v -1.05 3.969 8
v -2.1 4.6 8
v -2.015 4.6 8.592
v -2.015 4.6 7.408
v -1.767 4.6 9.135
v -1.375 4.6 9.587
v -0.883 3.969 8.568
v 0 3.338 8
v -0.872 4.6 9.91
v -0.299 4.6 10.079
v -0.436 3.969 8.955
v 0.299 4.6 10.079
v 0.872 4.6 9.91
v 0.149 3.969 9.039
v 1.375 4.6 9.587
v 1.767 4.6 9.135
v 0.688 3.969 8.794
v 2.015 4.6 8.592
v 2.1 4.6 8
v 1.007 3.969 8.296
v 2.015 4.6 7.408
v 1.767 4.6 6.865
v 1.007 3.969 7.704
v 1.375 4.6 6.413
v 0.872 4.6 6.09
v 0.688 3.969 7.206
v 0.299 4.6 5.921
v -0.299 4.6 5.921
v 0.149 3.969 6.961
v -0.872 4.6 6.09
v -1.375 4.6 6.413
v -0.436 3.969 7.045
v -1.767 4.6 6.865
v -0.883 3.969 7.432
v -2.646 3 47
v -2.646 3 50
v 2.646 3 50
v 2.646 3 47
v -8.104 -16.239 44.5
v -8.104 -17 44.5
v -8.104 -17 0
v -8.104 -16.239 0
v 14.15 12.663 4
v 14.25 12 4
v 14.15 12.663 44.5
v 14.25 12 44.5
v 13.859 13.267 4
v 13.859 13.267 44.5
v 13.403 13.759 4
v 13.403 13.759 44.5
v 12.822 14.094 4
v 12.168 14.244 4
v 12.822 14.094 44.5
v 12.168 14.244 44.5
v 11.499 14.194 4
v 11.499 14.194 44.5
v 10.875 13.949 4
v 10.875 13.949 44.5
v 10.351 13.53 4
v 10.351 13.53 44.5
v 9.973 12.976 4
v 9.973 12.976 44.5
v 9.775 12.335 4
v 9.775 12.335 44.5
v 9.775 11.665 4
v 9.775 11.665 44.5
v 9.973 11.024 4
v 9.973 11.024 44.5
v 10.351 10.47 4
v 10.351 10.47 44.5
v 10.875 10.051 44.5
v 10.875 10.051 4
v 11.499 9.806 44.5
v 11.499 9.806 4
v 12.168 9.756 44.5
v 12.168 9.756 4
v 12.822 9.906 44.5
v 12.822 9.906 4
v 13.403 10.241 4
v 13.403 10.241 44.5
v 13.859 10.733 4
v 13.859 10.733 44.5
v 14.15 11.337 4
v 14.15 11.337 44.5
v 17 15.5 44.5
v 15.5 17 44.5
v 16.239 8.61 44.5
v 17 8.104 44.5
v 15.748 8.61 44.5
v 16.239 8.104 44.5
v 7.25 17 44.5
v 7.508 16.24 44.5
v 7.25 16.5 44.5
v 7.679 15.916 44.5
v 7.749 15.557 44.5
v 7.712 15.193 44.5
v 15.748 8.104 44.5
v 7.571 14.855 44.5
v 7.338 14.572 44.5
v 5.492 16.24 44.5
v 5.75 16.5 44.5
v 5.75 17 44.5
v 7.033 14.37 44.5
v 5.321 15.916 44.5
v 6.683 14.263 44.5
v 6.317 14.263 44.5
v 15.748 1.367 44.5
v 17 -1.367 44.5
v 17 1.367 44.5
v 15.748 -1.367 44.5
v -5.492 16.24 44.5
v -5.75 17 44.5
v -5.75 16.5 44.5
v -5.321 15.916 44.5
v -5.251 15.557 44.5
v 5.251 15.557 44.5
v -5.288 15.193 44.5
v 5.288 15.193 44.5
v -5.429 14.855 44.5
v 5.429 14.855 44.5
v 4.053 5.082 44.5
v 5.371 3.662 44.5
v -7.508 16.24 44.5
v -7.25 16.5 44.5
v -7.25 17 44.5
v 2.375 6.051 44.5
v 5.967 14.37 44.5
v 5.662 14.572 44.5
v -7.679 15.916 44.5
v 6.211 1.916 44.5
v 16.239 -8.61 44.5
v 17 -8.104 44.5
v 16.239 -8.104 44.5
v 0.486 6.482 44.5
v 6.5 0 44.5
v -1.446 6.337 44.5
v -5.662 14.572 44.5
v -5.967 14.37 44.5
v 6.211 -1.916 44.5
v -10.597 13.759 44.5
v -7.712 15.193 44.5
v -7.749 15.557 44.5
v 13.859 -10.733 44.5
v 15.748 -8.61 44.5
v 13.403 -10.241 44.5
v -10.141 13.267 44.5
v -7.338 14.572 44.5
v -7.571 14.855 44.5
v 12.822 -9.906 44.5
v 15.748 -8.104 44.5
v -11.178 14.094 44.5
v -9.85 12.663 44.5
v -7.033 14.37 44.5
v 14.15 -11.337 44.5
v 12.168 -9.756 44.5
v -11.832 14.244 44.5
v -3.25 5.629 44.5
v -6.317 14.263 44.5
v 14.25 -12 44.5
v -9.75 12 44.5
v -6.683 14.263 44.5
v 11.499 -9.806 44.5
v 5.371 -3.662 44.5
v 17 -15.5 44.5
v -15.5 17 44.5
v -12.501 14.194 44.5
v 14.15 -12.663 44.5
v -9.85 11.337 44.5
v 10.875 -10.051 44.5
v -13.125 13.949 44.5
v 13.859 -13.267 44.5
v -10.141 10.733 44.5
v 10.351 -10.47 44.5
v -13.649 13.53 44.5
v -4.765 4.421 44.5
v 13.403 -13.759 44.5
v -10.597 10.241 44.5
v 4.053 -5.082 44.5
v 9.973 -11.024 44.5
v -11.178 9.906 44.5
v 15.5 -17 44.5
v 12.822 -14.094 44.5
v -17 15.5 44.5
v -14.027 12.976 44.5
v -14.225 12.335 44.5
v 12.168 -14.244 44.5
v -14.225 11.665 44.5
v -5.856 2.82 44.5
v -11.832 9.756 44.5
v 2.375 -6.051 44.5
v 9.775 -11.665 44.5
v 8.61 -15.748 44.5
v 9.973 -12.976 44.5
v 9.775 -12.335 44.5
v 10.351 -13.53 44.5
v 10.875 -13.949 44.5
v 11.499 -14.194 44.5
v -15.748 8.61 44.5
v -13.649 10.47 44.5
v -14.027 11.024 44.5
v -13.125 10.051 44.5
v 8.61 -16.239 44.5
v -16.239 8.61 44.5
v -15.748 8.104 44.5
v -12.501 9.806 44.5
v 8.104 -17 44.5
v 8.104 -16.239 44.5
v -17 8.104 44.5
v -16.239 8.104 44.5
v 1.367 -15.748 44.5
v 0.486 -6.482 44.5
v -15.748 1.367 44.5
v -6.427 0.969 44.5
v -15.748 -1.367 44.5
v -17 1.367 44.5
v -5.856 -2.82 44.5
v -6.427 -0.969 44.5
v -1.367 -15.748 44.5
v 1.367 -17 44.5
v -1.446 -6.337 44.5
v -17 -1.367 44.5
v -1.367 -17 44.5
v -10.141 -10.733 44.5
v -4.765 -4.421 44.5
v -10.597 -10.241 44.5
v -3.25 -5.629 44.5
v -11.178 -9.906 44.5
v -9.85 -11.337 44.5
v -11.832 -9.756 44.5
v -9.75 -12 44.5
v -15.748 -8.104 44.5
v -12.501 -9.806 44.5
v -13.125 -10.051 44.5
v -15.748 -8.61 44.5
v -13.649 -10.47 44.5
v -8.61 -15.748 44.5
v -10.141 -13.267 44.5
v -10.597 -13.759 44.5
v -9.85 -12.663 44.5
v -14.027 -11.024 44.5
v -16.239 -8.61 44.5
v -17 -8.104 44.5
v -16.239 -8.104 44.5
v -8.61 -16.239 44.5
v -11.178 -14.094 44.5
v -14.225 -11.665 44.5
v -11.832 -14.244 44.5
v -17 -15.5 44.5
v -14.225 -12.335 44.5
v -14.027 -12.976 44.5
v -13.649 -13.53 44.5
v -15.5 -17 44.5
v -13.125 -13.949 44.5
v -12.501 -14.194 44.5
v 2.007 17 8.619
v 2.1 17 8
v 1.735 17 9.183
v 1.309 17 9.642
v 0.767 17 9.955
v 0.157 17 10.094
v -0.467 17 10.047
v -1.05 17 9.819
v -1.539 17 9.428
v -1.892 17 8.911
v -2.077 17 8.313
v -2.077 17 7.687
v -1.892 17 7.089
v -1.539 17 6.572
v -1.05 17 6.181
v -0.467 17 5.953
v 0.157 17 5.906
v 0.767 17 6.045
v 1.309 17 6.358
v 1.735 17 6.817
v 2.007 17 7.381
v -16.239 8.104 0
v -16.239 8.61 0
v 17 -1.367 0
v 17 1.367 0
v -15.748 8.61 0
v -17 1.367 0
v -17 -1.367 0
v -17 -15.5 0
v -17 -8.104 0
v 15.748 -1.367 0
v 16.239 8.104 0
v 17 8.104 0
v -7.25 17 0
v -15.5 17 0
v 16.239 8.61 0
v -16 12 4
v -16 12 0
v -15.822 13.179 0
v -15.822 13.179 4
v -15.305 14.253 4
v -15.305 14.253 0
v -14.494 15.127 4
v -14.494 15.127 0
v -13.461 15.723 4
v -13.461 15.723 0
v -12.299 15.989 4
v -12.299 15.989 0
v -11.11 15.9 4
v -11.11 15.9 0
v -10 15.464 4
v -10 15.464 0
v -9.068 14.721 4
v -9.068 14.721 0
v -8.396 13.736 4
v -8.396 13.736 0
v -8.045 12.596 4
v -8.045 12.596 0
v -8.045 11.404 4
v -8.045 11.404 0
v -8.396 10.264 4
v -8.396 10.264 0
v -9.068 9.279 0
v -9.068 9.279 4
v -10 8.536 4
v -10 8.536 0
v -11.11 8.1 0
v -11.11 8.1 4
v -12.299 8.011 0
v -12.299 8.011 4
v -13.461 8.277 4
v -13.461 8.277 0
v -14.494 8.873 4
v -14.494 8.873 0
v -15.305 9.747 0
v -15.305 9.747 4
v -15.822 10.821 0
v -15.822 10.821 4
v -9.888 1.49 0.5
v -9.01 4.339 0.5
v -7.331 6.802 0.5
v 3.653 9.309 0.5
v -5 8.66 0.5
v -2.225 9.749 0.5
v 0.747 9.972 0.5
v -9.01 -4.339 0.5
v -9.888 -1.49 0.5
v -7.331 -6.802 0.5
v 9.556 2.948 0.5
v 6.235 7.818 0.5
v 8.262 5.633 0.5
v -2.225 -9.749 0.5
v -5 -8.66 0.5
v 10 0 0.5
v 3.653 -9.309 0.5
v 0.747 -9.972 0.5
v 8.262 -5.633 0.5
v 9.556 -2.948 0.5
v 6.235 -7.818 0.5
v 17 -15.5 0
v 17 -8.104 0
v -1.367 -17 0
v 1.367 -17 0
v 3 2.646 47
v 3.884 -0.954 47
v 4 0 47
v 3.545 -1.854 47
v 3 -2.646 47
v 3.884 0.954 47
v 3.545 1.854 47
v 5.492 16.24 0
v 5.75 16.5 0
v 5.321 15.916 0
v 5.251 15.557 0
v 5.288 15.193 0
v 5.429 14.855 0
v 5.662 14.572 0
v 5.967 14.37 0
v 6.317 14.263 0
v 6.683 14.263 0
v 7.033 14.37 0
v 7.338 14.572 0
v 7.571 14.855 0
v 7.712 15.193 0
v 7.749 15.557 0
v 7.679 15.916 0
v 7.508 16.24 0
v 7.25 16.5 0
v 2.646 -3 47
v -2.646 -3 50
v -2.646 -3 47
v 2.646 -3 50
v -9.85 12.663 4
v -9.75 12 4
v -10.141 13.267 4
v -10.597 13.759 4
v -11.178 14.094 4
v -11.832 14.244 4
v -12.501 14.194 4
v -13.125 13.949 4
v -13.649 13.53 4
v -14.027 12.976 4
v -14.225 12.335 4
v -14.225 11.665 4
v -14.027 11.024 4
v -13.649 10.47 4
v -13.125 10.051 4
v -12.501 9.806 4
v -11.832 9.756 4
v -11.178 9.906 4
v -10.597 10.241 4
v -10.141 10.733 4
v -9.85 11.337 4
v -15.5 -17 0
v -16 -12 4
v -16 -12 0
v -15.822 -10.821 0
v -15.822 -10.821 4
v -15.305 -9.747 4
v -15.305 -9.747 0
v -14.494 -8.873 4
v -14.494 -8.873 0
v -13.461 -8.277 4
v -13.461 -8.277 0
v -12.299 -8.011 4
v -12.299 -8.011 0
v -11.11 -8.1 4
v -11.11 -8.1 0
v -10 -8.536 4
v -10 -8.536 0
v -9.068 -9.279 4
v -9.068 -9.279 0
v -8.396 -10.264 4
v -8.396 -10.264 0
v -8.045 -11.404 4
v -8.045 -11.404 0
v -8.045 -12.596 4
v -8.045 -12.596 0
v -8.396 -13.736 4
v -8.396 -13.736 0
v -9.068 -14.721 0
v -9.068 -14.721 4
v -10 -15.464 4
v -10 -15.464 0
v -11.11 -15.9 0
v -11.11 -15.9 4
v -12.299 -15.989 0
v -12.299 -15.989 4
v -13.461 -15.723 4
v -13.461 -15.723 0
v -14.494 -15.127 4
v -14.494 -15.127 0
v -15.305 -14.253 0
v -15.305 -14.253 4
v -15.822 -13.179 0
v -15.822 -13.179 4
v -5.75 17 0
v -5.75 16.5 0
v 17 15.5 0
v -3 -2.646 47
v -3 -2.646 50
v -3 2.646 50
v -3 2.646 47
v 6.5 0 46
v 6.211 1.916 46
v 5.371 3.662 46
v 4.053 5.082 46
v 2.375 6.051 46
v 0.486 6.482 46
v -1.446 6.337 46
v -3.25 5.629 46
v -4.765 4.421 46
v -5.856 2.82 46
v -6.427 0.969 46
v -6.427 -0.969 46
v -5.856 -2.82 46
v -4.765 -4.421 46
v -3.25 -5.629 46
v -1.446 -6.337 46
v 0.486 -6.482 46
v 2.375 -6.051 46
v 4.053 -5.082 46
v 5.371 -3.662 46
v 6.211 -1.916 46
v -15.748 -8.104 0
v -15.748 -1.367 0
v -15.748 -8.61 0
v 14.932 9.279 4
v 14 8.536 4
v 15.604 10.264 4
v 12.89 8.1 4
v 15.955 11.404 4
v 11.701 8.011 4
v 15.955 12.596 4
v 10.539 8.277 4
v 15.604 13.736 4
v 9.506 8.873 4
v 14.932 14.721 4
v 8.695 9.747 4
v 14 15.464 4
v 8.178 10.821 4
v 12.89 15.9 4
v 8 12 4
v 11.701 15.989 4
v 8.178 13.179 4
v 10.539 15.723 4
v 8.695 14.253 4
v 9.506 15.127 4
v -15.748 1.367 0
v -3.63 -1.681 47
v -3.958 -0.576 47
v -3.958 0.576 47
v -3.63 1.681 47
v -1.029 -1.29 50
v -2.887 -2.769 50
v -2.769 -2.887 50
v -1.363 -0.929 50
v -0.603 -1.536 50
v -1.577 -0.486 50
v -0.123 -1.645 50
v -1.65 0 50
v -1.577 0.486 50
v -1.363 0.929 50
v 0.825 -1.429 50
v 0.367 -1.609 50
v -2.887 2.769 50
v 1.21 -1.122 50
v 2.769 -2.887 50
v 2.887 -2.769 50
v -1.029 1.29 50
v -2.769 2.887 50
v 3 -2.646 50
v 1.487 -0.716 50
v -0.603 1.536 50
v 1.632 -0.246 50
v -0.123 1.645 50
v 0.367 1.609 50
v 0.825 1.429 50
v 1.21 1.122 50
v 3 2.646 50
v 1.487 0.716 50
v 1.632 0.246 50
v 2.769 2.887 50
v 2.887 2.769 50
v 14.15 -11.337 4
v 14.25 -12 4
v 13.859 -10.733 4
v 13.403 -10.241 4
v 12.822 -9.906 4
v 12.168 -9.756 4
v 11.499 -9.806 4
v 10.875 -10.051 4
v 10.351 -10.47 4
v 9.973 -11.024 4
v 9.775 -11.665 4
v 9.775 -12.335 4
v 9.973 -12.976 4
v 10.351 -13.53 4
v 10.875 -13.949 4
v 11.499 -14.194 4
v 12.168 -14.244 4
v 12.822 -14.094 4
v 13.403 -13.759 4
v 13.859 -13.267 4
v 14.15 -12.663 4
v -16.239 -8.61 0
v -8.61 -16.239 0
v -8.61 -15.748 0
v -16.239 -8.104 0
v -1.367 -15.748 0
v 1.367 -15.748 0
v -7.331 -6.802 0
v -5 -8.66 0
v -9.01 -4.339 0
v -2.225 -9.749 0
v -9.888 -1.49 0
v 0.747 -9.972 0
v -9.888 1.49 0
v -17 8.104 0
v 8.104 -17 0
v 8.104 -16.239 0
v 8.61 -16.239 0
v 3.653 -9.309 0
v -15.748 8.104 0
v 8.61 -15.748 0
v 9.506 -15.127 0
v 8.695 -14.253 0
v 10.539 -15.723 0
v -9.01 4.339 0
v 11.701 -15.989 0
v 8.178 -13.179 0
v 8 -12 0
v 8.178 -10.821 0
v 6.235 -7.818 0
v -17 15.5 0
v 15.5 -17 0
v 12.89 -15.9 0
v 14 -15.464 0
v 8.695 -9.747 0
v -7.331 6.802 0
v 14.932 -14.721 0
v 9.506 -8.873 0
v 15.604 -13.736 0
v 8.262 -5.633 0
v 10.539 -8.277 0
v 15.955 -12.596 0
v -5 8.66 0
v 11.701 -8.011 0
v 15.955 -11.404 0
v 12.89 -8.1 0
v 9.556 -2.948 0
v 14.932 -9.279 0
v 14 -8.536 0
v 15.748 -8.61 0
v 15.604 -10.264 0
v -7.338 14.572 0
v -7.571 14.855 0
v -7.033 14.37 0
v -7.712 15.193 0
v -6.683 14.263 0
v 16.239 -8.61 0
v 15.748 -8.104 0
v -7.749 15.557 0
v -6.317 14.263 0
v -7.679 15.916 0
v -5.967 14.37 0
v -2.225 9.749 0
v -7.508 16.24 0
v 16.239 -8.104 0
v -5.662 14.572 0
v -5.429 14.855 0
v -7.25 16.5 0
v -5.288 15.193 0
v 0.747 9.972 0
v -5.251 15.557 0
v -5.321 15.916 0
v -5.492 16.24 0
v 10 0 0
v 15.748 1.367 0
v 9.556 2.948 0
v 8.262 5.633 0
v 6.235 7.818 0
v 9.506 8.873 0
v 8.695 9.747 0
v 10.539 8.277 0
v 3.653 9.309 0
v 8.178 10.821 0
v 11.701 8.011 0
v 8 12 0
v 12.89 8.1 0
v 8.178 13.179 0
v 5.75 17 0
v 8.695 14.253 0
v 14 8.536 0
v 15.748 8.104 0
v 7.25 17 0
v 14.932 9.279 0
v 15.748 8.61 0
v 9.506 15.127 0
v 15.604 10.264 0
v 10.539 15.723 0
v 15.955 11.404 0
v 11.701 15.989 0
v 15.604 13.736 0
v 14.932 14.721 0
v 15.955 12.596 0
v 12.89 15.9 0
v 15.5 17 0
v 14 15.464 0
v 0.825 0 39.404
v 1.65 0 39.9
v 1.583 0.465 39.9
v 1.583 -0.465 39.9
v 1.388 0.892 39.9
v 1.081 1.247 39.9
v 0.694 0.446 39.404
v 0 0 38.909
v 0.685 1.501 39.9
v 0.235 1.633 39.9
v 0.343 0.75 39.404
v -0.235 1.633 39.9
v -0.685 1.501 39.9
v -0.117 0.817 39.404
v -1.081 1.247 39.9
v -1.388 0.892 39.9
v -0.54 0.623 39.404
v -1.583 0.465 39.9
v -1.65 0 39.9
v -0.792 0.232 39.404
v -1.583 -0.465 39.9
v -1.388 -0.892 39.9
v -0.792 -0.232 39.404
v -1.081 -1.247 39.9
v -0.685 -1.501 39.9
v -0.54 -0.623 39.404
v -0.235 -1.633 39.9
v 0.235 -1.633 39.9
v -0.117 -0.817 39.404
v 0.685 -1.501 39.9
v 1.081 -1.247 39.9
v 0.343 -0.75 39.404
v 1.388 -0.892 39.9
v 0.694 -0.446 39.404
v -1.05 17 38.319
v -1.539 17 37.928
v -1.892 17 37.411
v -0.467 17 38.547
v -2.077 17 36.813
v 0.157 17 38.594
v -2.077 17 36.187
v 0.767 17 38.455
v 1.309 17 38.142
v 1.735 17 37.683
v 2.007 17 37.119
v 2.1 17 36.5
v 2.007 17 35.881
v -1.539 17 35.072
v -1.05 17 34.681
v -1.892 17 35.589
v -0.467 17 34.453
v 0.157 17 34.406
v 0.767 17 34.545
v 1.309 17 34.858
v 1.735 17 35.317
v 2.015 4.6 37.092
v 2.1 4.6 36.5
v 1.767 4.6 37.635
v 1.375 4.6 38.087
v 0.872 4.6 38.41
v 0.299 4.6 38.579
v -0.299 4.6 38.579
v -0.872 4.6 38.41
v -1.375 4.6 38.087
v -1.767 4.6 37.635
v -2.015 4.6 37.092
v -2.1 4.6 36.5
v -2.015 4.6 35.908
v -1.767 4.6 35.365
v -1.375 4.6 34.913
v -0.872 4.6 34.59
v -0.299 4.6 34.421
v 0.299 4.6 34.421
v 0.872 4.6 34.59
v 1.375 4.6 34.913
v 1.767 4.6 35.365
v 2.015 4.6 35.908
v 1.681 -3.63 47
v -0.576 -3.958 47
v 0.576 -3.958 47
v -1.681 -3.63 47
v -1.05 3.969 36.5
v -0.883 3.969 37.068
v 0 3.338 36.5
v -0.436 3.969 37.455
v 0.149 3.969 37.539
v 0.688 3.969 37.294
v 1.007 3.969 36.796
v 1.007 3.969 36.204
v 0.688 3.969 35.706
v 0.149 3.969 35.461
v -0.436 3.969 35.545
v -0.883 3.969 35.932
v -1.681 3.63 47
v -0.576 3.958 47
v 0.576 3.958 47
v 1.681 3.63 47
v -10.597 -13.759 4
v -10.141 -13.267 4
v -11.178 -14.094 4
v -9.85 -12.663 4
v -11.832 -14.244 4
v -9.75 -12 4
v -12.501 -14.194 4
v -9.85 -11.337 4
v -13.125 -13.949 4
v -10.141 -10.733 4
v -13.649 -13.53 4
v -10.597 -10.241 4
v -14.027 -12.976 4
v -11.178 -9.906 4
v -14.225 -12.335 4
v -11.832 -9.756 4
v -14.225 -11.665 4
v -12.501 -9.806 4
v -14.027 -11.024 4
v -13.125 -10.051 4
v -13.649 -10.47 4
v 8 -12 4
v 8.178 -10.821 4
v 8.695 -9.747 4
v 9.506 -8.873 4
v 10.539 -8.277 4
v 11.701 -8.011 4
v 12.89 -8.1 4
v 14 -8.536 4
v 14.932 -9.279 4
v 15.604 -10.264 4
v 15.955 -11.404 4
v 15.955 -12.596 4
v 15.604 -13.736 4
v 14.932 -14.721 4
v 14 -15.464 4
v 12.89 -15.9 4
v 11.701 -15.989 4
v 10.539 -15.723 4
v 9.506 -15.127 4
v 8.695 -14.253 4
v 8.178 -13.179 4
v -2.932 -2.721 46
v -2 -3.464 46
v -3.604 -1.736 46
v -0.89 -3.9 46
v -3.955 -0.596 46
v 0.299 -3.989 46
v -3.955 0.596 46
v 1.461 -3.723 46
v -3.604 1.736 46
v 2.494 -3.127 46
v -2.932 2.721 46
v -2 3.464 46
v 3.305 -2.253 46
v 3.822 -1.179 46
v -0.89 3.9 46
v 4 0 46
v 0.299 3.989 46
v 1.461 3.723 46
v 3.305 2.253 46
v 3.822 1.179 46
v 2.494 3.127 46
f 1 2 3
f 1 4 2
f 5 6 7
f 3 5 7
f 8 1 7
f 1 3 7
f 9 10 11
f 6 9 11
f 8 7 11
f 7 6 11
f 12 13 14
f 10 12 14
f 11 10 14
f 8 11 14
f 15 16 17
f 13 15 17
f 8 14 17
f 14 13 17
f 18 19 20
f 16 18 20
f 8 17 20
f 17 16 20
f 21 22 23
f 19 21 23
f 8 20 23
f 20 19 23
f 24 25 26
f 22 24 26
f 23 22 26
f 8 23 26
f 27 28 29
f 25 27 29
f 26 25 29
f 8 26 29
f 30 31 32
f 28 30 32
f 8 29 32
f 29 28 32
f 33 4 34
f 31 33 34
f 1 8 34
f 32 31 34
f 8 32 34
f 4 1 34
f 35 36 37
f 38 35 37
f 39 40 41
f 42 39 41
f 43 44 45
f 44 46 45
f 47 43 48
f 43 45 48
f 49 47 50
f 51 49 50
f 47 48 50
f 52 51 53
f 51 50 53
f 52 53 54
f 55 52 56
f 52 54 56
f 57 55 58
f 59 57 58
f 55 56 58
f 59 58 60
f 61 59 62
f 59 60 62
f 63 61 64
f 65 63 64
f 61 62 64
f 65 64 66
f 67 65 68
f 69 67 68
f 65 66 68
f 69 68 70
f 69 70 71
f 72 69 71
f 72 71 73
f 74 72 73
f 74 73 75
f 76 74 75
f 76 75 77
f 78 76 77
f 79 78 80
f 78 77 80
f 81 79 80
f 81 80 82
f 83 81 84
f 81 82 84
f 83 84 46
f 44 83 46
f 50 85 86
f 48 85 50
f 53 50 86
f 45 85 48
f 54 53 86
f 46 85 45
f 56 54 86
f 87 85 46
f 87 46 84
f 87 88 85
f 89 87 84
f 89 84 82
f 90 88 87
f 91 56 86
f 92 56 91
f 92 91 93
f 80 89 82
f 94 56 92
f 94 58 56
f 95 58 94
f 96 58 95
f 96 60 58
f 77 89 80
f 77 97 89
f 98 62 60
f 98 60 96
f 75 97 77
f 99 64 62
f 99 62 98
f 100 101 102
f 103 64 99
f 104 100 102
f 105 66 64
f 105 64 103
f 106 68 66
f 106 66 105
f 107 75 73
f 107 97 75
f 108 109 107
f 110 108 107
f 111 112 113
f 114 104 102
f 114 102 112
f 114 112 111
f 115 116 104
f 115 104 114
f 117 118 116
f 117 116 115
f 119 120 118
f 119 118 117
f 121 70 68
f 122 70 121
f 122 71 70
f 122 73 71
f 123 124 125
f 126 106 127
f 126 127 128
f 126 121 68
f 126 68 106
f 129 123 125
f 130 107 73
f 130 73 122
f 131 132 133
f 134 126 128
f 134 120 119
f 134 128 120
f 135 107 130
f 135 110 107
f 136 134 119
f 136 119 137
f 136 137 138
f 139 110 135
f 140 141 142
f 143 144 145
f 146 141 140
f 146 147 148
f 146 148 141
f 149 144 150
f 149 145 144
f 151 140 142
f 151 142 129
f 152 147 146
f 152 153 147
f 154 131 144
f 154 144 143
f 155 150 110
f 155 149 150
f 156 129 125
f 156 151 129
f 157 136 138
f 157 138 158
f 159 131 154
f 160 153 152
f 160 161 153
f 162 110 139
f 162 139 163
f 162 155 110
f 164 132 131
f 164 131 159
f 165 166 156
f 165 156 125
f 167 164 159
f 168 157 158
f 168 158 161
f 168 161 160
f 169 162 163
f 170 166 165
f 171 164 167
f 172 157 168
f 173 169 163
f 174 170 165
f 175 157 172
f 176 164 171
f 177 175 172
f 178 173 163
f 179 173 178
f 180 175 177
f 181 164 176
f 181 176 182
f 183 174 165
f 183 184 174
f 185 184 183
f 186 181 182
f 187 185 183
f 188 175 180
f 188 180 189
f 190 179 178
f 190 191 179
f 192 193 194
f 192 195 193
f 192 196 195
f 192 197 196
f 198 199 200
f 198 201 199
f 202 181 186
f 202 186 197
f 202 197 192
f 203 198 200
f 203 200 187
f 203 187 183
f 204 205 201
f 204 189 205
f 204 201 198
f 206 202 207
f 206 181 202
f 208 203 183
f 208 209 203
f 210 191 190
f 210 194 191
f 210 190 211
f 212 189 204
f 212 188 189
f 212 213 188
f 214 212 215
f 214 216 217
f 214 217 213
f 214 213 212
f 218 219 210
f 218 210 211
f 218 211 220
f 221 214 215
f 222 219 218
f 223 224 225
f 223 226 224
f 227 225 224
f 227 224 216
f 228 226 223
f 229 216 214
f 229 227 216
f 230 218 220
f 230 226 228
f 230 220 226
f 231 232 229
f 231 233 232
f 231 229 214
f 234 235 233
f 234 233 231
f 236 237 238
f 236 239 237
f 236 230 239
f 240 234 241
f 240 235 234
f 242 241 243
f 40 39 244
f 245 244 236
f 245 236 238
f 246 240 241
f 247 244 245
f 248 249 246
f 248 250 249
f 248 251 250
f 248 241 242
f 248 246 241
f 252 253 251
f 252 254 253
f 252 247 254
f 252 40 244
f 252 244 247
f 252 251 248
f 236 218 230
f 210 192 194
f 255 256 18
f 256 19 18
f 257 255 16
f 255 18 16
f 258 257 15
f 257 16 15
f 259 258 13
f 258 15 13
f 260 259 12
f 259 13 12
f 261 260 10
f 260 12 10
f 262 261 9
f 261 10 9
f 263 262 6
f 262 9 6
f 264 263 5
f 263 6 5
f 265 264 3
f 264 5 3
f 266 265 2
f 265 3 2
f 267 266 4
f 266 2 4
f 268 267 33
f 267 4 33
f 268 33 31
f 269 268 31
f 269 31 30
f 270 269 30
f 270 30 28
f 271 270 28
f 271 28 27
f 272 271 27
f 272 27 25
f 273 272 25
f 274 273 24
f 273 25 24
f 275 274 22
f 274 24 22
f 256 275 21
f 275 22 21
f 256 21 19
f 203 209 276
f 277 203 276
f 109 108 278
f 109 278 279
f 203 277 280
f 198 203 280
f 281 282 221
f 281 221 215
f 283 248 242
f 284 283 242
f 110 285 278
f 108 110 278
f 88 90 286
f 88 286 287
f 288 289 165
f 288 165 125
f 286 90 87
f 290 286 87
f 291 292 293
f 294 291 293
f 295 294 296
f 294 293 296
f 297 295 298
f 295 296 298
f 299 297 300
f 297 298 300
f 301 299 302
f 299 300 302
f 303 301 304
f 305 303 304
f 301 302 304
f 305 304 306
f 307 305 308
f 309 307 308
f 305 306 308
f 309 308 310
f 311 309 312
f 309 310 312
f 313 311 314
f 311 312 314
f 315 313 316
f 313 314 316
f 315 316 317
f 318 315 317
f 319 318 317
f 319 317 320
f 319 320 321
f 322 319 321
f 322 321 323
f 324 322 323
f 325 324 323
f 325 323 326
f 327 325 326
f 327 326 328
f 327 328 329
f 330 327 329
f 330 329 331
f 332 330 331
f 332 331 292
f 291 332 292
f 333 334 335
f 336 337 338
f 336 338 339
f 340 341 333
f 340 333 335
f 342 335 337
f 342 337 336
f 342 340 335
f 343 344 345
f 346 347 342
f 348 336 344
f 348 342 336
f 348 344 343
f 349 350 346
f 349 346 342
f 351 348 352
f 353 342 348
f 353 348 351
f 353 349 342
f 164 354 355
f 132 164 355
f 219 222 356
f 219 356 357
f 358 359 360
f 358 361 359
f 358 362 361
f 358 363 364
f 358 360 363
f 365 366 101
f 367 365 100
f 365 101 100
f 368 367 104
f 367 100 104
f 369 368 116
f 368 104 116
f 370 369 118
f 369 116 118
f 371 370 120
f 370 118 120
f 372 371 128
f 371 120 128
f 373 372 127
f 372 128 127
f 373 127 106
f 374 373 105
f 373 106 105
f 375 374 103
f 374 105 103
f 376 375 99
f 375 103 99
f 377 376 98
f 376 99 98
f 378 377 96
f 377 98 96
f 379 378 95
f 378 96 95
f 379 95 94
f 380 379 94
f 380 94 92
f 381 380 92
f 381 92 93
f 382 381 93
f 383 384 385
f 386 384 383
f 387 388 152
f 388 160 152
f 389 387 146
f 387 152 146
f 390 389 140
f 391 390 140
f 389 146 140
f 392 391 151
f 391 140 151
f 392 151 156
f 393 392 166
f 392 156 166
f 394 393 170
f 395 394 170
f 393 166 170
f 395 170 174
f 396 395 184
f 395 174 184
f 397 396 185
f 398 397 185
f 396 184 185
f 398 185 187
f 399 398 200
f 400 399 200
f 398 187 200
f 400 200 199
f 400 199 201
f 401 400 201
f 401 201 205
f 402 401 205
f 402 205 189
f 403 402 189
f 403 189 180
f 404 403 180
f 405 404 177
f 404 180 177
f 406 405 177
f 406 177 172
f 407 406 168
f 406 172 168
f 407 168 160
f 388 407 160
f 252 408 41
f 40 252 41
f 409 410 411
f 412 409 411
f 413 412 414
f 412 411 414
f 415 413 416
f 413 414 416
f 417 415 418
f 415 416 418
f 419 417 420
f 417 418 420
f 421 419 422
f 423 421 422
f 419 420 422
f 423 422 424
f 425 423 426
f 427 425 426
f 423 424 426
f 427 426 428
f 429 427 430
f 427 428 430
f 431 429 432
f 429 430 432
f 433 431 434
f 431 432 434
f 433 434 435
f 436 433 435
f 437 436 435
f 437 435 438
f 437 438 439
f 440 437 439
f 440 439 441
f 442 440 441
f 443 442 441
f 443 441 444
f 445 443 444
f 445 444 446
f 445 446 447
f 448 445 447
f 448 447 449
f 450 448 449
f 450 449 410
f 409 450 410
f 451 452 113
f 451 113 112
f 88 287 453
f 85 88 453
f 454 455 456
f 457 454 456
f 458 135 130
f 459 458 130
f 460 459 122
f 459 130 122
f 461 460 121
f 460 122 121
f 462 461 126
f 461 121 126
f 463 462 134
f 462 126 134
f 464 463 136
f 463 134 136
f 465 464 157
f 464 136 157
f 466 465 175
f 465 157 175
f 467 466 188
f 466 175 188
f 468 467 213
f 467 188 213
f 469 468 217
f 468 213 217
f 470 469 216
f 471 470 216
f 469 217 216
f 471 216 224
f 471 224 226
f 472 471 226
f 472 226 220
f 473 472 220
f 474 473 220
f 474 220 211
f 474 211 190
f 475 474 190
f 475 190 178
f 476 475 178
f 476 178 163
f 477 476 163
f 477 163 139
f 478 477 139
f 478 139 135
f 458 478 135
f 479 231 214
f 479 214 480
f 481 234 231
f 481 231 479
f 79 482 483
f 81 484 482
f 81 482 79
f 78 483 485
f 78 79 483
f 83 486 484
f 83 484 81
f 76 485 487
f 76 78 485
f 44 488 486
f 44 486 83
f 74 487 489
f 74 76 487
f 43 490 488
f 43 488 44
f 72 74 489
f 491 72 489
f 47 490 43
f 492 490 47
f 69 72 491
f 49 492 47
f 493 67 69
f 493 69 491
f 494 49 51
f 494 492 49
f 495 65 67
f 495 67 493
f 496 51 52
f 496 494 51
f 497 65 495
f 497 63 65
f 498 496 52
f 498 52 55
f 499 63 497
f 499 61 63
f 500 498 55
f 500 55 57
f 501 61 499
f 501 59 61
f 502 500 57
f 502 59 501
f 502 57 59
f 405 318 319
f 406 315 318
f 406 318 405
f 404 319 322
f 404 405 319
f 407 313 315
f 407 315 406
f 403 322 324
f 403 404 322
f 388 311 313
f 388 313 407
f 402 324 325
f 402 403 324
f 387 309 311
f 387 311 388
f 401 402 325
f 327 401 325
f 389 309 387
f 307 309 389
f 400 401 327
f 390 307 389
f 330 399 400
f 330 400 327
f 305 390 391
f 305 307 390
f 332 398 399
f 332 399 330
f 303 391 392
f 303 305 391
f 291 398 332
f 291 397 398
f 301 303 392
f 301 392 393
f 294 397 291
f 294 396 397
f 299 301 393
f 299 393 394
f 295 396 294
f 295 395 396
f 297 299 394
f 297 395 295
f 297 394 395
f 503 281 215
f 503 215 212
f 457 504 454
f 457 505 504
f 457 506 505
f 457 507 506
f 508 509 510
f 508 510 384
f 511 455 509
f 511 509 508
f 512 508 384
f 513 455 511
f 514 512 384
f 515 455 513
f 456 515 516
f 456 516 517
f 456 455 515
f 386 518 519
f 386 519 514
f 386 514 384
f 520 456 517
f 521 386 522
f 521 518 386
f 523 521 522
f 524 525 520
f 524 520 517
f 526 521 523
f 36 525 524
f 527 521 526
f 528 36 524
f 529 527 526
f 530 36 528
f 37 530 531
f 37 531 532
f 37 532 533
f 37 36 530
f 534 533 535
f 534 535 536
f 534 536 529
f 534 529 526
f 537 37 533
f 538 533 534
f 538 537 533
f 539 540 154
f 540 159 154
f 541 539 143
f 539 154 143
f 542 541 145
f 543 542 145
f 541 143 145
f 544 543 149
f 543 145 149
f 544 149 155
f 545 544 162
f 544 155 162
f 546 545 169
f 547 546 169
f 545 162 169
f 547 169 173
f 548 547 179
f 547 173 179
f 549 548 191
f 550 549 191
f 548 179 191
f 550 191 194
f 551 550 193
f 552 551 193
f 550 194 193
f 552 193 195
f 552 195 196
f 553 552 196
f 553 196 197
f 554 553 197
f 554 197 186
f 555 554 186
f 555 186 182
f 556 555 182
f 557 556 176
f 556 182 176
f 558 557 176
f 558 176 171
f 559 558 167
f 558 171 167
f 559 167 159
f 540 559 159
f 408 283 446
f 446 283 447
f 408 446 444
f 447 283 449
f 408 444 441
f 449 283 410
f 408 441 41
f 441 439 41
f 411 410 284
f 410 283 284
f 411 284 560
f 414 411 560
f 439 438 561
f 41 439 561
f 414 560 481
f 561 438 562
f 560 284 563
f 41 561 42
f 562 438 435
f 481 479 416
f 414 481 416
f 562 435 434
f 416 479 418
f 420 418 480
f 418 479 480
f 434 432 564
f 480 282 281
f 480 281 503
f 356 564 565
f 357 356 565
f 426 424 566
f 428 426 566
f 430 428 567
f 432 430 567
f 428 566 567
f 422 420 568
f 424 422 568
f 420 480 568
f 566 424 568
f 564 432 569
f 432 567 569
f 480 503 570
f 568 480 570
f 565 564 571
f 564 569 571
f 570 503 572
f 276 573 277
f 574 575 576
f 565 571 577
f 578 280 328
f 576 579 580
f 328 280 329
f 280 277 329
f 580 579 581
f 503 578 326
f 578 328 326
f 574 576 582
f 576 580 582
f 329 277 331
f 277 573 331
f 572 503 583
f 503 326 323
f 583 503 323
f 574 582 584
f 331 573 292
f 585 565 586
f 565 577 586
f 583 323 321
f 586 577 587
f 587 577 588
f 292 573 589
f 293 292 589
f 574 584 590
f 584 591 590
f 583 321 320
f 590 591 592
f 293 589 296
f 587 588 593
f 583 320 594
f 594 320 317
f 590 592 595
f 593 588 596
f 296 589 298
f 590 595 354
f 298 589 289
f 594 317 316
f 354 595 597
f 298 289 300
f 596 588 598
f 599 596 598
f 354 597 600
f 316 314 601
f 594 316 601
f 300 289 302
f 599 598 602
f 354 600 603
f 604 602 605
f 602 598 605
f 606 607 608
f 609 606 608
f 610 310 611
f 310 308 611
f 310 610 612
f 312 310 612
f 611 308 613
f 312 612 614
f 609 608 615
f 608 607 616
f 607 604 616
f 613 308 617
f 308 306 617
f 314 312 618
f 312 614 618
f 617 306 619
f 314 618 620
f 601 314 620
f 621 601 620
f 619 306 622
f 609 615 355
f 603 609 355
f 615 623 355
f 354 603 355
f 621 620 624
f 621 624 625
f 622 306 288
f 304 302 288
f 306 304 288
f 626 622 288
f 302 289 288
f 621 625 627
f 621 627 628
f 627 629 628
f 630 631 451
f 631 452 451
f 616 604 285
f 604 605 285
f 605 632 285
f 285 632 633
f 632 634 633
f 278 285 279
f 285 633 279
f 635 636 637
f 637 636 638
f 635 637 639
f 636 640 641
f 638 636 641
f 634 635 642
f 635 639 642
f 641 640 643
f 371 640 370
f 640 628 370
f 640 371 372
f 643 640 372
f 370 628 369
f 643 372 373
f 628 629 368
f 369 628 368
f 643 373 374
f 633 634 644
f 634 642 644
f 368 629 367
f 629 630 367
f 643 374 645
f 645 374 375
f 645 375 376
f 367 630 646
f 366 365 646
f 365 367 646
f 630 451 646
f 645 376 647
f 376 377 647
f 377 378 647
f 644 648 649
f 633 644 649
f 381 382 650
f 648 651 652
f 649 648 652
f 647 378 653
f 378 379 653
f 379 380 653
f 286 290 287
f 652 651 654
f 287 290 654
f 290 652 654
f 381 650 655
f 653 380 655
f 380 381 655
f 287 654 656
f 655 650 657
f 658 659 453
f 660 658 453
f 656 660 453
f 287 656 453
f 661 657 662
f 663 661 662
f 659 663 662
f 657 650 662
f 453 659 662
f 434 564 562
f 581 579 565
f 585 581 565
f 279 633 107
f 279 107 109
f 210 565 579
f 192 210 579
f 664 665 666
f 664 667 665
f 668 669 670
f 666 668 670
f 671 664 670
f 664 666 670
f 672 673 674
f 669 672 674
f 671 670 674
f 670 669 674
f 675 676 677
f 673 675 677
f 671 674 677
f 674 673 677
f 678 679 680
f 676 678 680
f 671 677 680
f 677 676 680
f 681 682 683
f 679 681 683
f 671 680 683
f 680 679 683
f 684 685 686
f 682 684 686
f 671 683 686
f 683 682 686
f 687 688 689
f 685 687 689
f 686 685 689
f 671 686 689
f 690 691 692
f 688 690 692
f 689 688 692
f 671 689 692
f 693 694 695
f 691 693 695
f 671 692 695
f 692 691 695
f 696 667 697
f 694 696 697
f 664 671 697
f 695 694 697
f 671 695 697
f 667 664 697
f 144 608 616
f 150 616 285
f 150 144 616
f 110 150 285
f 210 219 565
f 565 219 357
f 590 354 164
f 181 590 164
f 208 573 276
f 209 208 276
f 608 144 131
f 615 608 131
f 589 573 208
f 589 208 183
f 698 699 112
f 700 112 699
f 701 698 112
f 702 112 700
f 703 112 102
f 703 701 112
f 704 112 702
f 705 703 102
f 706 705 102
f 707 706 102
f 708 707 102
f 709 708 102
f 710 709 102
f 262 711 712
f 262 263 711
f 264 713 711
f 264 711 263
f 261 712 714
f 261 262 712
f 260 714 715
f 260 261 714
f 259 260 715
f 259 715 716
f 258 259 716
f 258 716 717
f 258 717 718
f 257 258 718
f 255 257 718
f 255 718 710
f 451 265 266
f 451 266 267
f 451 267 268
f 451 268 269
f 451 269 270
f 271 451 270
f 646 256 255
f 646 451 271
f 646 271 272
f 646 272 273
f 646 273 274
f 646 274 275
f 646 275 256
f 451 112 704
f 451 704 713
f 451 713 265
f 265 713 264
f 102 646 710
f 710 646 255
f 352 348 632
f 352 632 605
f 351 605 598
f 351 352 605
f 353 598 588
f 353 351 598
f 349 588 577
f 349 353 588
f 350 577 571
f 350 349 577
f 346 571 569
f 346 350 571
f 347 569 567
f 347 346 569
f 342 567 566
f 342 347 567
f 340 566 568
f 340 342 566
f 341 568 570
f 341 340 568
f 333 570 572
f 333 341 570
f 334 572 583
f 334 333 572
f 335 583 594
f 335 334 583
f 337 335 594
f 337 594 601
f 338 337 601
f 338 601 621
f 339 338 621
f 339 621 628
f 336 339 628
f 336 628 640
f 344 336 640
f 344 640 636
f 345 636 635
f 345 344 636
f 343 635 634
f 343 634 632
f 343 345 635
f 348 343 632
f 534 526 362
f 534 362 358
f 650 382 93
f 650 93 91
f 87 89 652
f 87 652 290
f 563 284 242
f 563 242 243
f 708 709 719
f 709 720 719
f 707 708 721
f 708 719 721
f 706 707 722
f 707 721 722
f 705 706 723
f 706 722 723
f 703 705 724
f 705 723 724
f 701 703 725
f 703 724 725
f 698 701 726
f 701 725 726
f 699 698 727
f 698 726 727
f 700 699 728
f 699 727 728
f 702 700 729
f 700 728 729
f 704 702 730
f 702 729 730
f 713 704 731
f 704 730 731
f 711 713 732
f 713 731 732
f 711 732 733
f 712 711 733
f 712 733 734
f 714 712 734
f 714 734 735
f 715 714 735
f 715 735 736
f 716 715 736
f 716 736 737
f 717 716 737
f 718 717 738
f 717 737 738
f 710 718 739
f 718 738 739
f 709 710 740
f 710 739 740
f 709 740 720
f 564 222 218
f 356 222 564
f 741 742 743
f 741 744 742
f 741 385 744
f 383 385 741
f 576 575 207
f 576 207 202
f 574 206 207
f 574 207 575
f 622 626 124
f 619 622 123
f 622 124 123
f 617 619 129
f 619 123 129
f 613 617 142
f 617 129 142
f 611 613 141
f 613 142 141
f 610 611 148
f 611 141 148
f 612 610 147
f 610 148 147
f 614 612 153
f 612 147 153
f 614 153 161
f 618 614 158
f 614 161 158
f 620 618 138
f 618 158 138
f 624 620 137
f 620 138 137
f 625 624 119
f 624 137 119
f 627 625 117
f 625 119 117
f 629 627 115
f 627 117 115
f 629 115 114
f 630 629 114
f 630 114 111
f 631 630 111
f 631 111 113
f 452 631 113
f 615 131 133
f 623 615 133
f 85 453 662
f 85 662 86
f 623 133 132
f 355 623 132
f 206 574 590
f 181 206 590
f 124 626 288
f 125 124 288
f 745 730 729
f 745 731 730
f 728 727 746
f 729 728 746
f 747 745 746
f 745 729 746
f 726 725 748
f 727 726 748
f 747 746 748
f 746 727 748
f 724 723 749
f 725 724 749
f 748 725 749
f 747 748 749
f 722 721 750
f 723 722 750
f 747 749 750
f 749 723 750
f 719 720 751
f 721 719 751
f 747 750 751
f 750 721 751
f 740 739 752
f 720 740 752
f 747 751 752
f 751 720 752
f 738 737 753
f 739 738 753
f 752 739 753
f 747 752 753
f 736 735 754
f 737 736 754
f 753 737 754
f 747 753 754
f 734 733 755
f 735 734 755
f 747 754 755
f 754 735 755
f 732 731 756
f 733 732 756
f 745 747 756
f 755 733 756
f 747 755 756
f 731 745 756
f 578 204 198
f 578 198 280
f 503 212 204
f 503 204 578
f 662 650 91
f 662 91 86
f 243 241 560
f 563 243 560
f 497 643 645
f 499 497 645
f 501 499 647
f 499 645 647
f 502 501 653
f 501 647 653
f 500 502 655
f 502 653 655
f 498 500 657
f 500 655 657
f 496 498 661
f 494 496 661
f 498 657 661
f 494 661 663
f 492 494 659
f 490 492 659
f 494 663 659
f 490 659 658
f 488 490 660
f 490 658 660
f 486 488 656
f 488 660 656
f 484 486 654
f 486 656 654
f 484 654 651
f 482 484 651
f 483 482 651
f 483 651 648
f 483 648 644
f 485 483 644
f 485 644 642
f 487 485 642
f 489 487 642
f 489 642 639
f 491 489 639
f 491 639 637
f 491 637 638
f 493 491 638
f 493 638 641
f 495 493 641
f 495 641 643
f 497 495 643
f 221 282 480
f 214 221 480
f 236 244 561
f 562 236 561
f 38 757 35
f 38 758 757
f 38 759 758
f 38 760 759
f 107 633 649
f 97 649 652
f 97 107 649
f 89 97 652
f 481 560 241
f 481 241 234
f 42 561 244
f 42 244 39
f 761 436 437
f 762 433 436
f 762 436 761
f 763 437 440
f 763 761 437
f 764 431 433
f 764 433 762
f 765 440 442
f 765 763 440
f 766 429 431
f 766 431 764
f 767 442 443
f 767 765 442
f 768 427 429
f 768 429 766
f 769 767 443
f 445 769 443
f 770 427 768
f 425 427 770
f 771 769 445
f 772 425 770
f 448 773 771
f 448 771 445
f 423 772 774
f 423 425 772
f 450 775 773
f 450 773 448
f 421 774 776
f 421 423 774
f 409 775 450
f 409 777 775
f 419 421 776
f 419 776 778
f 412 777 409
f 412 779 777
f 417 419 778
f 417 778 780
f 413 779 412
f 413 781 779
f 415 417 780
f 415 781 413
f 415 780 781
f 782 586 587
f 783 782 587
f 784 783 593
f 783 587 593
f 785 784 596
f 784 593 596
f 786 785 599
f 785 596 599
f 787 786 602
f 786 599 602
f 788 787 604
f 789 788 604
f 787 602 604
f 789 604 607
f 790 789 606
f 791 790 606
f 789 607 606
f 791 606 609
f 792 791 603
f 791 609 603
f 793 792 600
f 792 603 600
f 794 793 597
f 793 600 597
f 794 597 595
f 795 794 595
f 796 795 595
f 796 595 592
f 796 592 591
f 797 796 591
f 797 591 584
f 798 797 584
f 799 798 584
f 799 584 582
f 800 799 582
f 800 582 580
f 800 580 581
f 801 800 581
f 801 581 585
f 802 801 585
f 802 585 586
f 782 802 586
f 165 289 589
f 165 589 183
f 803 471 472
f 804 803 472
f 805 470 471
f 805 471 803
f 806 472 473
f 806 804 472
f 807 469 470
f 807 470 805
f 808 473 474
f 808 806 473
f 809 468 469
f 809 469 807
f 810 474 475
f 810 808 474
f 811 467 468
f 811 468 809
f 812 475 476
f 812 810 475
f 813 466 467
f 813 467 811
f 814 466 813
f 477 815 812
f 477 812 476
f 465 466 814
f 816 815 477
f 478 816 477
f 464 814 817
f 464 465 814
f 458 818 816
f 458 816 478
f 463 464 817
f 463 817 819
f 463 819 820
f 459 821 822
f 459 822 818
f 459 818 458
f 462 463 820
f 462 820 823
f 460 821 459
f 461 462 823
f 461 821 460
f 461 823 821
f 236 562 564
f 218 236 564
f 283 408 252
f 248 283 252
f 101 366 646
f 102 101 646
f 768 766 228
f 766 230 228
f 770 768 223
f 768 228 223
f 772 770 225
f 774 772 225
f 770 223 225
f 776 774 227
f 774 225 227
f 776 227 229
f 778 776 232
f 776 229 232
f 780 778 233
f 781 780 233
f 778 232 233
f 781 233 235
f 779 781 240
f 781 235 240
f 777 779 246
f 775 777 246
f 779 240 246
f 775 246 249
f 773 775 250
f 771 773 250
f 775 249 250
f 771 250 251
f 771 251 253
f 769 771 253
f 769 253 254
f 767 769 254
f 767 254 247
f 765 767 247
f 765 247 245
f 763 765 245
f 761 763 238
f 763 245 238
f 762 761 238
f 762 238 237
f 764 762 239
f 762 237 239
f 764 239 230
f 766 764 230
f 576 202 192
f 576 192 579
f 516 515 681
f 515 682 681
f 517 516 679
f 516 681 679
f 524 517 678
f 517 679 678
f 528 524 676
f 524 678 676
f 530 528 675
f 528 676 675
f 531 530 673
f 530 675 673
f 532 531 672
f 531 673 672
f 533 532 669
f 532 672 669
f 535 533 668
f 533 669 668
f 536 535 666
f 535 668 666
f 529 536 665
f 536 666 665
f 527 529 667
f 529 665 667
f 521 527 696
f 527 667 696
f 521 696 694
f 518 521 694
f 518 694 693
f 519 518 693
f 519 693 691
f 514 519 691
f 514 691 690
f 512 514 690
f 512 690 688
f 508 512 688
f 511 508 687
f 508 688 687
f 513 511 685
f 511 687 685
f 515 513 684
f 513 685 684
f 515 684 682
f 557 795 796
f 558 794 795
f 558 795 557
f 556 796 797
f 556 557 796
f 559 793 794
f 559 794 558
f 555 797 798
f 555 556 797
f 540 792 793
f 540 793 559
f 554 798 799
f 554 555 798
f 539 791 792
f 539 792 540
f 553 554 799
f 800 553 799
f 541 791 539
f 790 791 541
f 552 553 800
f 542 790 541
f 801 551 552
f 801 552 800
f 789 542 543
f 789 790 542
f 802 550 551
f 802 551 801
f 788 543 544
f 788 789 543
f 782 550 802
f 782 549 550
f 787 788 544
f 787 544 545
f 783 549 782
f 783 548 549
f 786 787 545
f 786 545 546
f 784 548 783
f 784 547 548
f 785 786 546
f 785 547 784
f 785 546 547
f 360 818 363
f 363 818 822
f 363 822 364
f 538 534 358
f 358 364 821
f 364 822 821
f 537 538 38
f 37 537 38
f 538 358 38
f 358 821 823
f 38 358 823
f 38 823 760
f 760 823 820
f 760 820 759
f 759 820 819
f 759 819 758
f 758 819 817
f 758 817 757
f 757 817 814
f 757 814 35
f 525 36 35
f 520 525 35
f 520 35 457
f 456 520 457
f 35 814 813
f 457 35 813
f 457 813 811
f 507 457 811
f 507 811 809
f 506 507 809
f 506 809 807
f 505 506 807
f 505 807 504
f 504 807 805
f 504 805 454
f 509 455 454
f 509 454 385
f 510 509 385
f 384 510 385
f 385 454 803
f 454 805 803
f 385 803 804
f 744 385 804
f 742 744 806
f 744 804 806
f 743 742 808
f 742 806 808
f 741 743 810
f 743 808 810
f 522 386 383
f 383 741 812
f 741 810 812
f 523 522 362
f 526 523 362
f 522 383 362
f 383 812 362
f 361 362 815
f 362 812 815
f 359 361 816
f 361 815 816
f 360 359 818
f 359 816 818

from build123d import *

# Parameters (mm, degrees)
SKETCH_1_W                     = 34
SKETCH_1_H                     = 34
EXTRUDE_1_DEPTH                = 44.5
SKETCH_2_R                     = 10
CUT_EXTRUDE_1_DEPTH            = 0.5
CUT_EXTRUDE_START              = -0.5
SKETCH_3_R                     = 10
CUT_EXTRUDE_2_DEPTH            = 0.5
SKETCH_4_R                     = 4
EXTRUDE_2_DEPTH                = 6
CHAMFER_1_SIZE                 = 1.5
HOLE_WIZARD_M4_1_D             = 4.5
HOLE_WIZARD_M4_1_CBORE_D       = 8
HOLE_WIZARD_M4_1_CBORE_DEPTH   = 4
HOLE_WIZARD_M4_1_2_D           = 3.3
HOLE_WIZARD_M4_1_2_DEPTH       = 10.1
HOLE_WIZARD_M4_1_2_TIP         = 0.991420021
SKETCH_9_W                     = 5.05425195
SKETCH_9_H                     = 13.3836291
SKETCH_9_W_2                   = 3.579653673
SKETCH_9_H_2                   = 11.317985889
CUT_EXTRUDE_3_DEPTH            = 3
SKETCH_14_R                    = 1.25
CUT_EXTRUDE_6_DEPTH            = 51.5791459
SKETCH_15_W                    = 1.5
SKETCH_15_H                    = 1
CUT_EXTRUDE_7_DEPTH            = 51.5791459
PATTERN_CIRCULAR_1_COUNT       = 2
PATTERN_CIRCULAR_1_ANGLE       = 90
SKETCH_16_R                    = 6.5
SKETCH_16_R_2                  = 1.65
EXTRUDE_3_DEPTH                = 2
EXTRUDE_START                  = 0.5
SKETCH_17_R                    = 10
SKETCH_17_R_2                  = 1.65
EXTRUDE_4_DEPTH                = 0.5
SKETCH_18_W                    = 1.251760675
SKETCH_18_H                    = 6.736418335
CUT_EXTRUDE_8_DEPTH            = 51.5791459
SKETCH_19_W                    = 0.490453646
SKETCH_19_H                    = 0.506695446
CUT_EXTRUDE_9_DEPTH            = 51.5791459
PATTERN_START                  = -17
PATTERN_CIRCULAR_2_OUTLINE_W   = 6.736418335
PATTERN_CIRCULAR_2_OUTLINE_H   = 44.5
PATTERN_CIRCULAR_2_DEPTH       = 1.251760675
PATTERN_START_2                = -8.103506379
PATTERN_CIRCULAR_2_2_OUTLINE_W = 1.251760675
PATTERN_CIRCULAR_2_2_OUTLINE_H = 44.5
PATTERN_CIRCULAR_2_2_DEPTH     = 6.736418335
PATTERN_START_3                = 1.367088044
PATTERN_CIRCULAR_2_3_OUTLINE_W = 1.251760675
PATTERN_CIRCULAR_2_3_OUTLINE_H = 44.5
PATTERN_CIRCULAR_2_3_DEPTH     = 6.736418335
PATTERN_START_4                = -16.238692971
PATTERN_CIRCULAR_2_4_OUTLINE_W = 0.506695446
PATTERN_CIRCULAR_2_4_OUTLINE_H = 44.5
PATTERN_CIRCULAR_2_4_DEPTH     = 0.490453646
PATTERN_START_5                = -8.610201825
PATTERN_CIRCULAR_2_5_OUTLINE_W = 0.490453646
PATTERN_CIRCULAR_2_5_OUTLINE_H = 44.5
PATTERN_CIRCULAR_2_5_DEPTH     = 0.506695446
PATTERN_START_6                = 8.103506379
PATTERN_CIRCULAR_2_6_OUTLINE_W = 0.490453646
PATTERN_CIRCULAR_2_6_OUTLINE_H = 44.5
PATTERN_CIRCULAR_2_6_DEPTH     = 0.506695446
HOLE_WIZARD_M5_1_D             = 4.2
HOLE_WIZARD_M5_1_DEPTH         = 12.4
HOLE_WIZARD_M5_1_TIP           = 1.2618073


# Read off the part's stored shape, not the designer's step: 阵列(圆周)2
with BuildPart() as part:
    # 草图1 → 凸台-拉伸1 (new body)
    with BuildSketch(Plane.XY):
        Rectangle(SKETCH_1_W, SKETCH_1_H)
    extrude(amount=EXTRUDE_1_DEPTH)

    # 草图2 → 切除-拉伸1 (cut)
    with BuildSketch(Plane.XY.offset(44.5)):
        Circle(SKETCH_2_R)
    extrude(amount=-CUT_EXTRUDE_1_DEPTH, mode=Mode.SUBTRACT)

    # 草图3 → 切除-拉伸2 (cut)
    with BuildSketch(Plane(origin=(0, 0, 0), x_dir=(-1, 0, 0), z_dir=(0, 0, -1)).offset(CUT_EXTRUDE_START)):
        with Locations(Location((0, 0, 0), (0, 0, 180))):
            Circle(SKETCH_3_R)
    extrude(amount=CUT_EXTRUDE_2_DEPTH, mode=Mode.SUBTRACT)

    # 草图4 → 凸台-拉伸2 (add)
    with BuildSketch(Plane.XY.offset(44)):
        Circle(SKETCH_4_R)
    extrude(amount=EXTRUDE_2_DEPTH)

    # 倒角1
    chamfer_1_edges = [part.edges().sort_by_distance(p)[0] for p in [
        (-17, 17, 22.25),
        (17, 17, 22.25),
        (17, -17, 22.25),
        (-17, -17, 22.25),
    ]]
    chamfer(chamfer_1_edges, length=CHAMFER_1_SIZE)

    # Hole Wizard M4 _1 (through all)
    with Locations(Plane(origin=(0, 0, 0), x_dir=(-1, 0, 0), z_dir=(0, 0, -1))):
        with Locations((-12, 12), (12, -12), (12, 12), (-12, -12)):
            CounterBoreHole(HOLE_WIZARD_M4_1_D / 2, HOLE_WIZARD_M4_1_CBORE_D / 2, HOLE_WIZARD_M4_1_CBORE_DEPTH)

    # Hole Wizard M4 _1 2
    with Locations(Plane.XY.offset(50)):
        with Locations((0, 0)):
            Hole(HOLE_WIZARD_M4_1_2_D / 2, depth=HOLE_WIZARD_M4_1_2_DEPTH)
            with Locations((0, 0, -(HOLE_WIZARD_M4_1_2_DEPTH + HOLE_WIZARD_M4_1_2_TIP / 2))):  # 118° drill point
                Cone(0, HOLE_WIZARD_M4_1_2_D / 2, HOLE_WIZARD_M4_1_2_TIP, mode=Mode.SUBTRACT)

    # 草图9 → 切除-拉伸3 (cut)
    with BuildSketch(Plane.XY.offset(50)):
        with Locations((-5.527125975, -0.54919334)):
            Rectangle(SKETCH_9_W, SKETCH_9_H)
        with Locations((4.789826836, -0.152935728)):
            Rectangle(SKETCH_9_W_2, SKETCH_9_H_2)
    cut_extrude_3 = extrude(amount=-CUT_EXTRUDE_3_DEPTH, mode=Mode.SUBTRACT)

    # 草图14 → 切除-拉伸6 (cut, through all)
    with BuildSketch(Plane.XY.offset(44.5)):
        with Locations((-6.5, 15.5)):
            Circle(SKETCH_14_R)
        with Locations(Location((6.5, 15.5, 0), (0, 0, 180))):
            Circle(SKETCH_14_R)
    extrude(amount=-CUT_EXTRUDE_6_DEPTH, mode=Mode.SUBTRACT)

    # 草图15 → 切除-拉伸7 (cut, through all)
    with BuildSketch(Plane.XY.offset(44.5)):
        with Locations((-6.5, 16.5)):
            Rectangle(SKETCH_15_W, SKETCH_15_H)
        with Locations((6.5, 16.5)):
            Rectangle(SKETCH_15_W, SKETCH_15_H)
    extrude(amount=-CUT_EXTRUDE_7_DEPTH, mode=Mode.SUBTRACT)

    # 阵列(圆周)1: 切除-拉伸3 ×2 about axis
    pattern_circular_1_axis = Axis((0, 0, 50), (0, 0, -1))
    for i in range(1, PATTERN_CIRCULAR_1_COUNT):
        add(cut_extrude_3.rotate(pattern_circular_1_axis, i * PATTERN_CIRCULAR_1_ANGLE / (PATTERN_CIRCULAR_1_COUNT - 1)), mode=Mode.SUBTRACT)

    # 草图16 → 凸台-拉伸3 (add)
    with BuildSketch(Plane.XY.offset(44)):
        Circle(SKETCH_16_R)
        Circle(SKETCH_16_R_2, mode=Mode.SUBTRACT)
    extrude(amount=EXTRUDE_3_DEPTH)

    # 草图17 → 凸台-拉伸4 (add)
    with BuildSketch(Plane.XY.offset(44).offset(EXTRUDE_START)):
        with Locations(Location((0, 0, 0), (0, 0, 180))):
            Circle(SKETCH_17_R)
        Circle(SKETCH_17_R_2, mode=Mode.SUBTRACT)
    extrude(amount=-EXTRUDE_4_DEPTH)

    # 草图18 → 切除-拉伸8 (cut, through all)
    with BuildSketch(Plane.XY.offset(44.5)):
        with Locations((16.374119663, 4.735297212)):
            Rectangle(SKETCH_18_W, SKETCH_18_H)
        with Locations((16.374119663, -4.735297212)):
            Rectangle(SKETCH_18_W, SKETCH_18_H)
    extrude(amount=-CUT_EXTRUDE_8_DEPTH, mode=Mode.SUBTRACT)

    # 草图19 → 切除-拉伸9 (cut, through all)
    with BuildSketch(Plane.XY.offset(44.5)):
        with Locations((15.993466148, 8.356854102)):
            Rectangle(SKETCH_19_W, SKETCH_19_H)
        with Locations((15.993466148, -8.356854102)):
            Rectangle(SKETCH_19_W, SKETCH_19_H)
    extrude(amount=-CUT_EXTRUDE_9_DEPTH, mode=Mode.SUBTRACT)

    # 阵列(圆周)2 outline → 阵列(圆周)2 (cut)
    with BuildSketch(Plane(origin=(0, 0, 0), x_dir=(1, 0, 0), z_dir=(0, 1, 0)).offset(PATTERN_START)):
        with Locations((4.735297212, -22.25)):
            Rectangle(PATTERN_CIRCULAR_2_OUTLINE_W, PATTERN_CIRCULAR_2_OUTLINE_H)
        with Locations((-4.735297212, -22.25)):
            Rectangle(PATTERN_CIRCULAR_2_OUTLINE_W, PATTERN_CIRCULAR_2_OUTLINE_H)
    extrude(amount=PATTERN_CIRCULAR_2_DEPTH, mode=Mode.SUBTRACT)

    # Pattern Circular 2 2 outline → Pattern Circular 2 2 (cut)
    with BuildSketch(Plane(origin=(0, 0, 0), x_dir=(1, 0, 0), z_dir=(0, 1, 0)).offset(PATTERN_START_2)):
        with Locations((-16.374119663, -22.25)):
            Rectangle(PATTERN_CIRCULAR_2_2_OUTLINE_W, PATTERN_CIRCULAR_2_2_OUTLINE_H)
    extrude(amount=PATTERN_CIRCULAR_2_2_DEPTH, mode=Mode.SUBTRACT)

    # Pattern Circular 2 3 outline → Pattern Circular 2 3 (cut)
    with BuildSketch(Plane(origin=(0, 0, 0), x_dir=(1, 0, 0), z_dir=(0, 1, 0)).offset(PATTERN_START_3)):
        with Locations((-16.374119663, -22.25)):
            Rectangle(PATTERN_CIRCULAR_2_3_OUTLINE_W, PATTERN_CIRCULAR_2_3_OUTLINE_H)
    extrude(amount=PATTERN_CIRCULAR_2_3_DEPTH, mode=Mode.SUBTRACT)

    # Pattern Circular 2 4 outline → Pattern Circular 2 4 (cut)
    with BuildSketch(Plane(origin=(0, 0, 0), x_dir=(1, 0, 0), z_dir=(0, 1, 0)).offset(PATTERN_START_4)):
        with Locations((8.356854102, -22.25)):
            Rectangle(PATTERN_CIRCULAR_2_4_OUTLINE_W, PATTERN_CIRCULAR_2_4_OUTLINE_H)
        with Locations((-8.356854102, -22.25)):
            Rectangle(PATTERN_CIRCULAR_2_4_OUTLINE_W, PATTERN_CIRCULAR_2_4_OUTLINE_H)
    extrude(amount=PATTERN_CIRCULAR_2_4_DEPTH, mode=Mode.SUBTRACT)

    # Pattern Circular 2 5 outline → Pattern Circular 2 5 (cut)
    with BuildSketch(Plane(origin=(0, 0, 0), x_dir=(1, 0, 0), z_dir=(0, 1, 0)).offset(PATTERN_START_5)):
        with Locations((-15.993466148, -22.25)):
            Rectangle(PATTERN_CIRCULAR_2_5_OUTLINE_W, PATTERN_CIRCULAR_2_5_OUTLINE_H)
    extrude(amount=PATTERN_CIRCULAR_2_5_DEPTH, mode=Mode.SUBTRACT)

    # Pattern Circular 2 6 outline → Pattern Circular 2 6 (cut)
    with BuildSketch(Plane(origin=(0, 0, 0), x_dir=(1, 0, 0), z_dir=(0, 1, 0)).offset(PATTERN_START_6)):
        with Locations((-15.993466148, -22.25)):
            Rectangle(PATTERN_CIRCULAR_2_6_OUTLINE_W, PATTERN_CIRCULAR_2_6_OUTLINE_H)
    extrude(amount=PATTERN_CIRCULAR_2_6_DEPTH, mode=Mode.SUBTRACT)

    # M5 螺纹孔1
    with Locations(Plane(origin=(0, 17, 0), x_dir=(-1, 0, 0), z_dir=(0, 1, 0))):
        with Locations((0, 36.5), (0, 8)):
            Hole(HOLE_WIZARD_M5_1_D / 2, depth=HOLE_WIZARD_M5_1_DEPTH)
            with Locations((0, 0, -(HOLE_WIZARD_M5_1_DEPTH + HOLE_WIZARD_M5_1_TIP / 2))):  # 118° drill point
                Cone(0, HOLE_WIZARD_M5_1_D / 2, HOLE_WIZARD_M5_1_TIP, mode=Mode.SUBTRACT)


solid = part.part
